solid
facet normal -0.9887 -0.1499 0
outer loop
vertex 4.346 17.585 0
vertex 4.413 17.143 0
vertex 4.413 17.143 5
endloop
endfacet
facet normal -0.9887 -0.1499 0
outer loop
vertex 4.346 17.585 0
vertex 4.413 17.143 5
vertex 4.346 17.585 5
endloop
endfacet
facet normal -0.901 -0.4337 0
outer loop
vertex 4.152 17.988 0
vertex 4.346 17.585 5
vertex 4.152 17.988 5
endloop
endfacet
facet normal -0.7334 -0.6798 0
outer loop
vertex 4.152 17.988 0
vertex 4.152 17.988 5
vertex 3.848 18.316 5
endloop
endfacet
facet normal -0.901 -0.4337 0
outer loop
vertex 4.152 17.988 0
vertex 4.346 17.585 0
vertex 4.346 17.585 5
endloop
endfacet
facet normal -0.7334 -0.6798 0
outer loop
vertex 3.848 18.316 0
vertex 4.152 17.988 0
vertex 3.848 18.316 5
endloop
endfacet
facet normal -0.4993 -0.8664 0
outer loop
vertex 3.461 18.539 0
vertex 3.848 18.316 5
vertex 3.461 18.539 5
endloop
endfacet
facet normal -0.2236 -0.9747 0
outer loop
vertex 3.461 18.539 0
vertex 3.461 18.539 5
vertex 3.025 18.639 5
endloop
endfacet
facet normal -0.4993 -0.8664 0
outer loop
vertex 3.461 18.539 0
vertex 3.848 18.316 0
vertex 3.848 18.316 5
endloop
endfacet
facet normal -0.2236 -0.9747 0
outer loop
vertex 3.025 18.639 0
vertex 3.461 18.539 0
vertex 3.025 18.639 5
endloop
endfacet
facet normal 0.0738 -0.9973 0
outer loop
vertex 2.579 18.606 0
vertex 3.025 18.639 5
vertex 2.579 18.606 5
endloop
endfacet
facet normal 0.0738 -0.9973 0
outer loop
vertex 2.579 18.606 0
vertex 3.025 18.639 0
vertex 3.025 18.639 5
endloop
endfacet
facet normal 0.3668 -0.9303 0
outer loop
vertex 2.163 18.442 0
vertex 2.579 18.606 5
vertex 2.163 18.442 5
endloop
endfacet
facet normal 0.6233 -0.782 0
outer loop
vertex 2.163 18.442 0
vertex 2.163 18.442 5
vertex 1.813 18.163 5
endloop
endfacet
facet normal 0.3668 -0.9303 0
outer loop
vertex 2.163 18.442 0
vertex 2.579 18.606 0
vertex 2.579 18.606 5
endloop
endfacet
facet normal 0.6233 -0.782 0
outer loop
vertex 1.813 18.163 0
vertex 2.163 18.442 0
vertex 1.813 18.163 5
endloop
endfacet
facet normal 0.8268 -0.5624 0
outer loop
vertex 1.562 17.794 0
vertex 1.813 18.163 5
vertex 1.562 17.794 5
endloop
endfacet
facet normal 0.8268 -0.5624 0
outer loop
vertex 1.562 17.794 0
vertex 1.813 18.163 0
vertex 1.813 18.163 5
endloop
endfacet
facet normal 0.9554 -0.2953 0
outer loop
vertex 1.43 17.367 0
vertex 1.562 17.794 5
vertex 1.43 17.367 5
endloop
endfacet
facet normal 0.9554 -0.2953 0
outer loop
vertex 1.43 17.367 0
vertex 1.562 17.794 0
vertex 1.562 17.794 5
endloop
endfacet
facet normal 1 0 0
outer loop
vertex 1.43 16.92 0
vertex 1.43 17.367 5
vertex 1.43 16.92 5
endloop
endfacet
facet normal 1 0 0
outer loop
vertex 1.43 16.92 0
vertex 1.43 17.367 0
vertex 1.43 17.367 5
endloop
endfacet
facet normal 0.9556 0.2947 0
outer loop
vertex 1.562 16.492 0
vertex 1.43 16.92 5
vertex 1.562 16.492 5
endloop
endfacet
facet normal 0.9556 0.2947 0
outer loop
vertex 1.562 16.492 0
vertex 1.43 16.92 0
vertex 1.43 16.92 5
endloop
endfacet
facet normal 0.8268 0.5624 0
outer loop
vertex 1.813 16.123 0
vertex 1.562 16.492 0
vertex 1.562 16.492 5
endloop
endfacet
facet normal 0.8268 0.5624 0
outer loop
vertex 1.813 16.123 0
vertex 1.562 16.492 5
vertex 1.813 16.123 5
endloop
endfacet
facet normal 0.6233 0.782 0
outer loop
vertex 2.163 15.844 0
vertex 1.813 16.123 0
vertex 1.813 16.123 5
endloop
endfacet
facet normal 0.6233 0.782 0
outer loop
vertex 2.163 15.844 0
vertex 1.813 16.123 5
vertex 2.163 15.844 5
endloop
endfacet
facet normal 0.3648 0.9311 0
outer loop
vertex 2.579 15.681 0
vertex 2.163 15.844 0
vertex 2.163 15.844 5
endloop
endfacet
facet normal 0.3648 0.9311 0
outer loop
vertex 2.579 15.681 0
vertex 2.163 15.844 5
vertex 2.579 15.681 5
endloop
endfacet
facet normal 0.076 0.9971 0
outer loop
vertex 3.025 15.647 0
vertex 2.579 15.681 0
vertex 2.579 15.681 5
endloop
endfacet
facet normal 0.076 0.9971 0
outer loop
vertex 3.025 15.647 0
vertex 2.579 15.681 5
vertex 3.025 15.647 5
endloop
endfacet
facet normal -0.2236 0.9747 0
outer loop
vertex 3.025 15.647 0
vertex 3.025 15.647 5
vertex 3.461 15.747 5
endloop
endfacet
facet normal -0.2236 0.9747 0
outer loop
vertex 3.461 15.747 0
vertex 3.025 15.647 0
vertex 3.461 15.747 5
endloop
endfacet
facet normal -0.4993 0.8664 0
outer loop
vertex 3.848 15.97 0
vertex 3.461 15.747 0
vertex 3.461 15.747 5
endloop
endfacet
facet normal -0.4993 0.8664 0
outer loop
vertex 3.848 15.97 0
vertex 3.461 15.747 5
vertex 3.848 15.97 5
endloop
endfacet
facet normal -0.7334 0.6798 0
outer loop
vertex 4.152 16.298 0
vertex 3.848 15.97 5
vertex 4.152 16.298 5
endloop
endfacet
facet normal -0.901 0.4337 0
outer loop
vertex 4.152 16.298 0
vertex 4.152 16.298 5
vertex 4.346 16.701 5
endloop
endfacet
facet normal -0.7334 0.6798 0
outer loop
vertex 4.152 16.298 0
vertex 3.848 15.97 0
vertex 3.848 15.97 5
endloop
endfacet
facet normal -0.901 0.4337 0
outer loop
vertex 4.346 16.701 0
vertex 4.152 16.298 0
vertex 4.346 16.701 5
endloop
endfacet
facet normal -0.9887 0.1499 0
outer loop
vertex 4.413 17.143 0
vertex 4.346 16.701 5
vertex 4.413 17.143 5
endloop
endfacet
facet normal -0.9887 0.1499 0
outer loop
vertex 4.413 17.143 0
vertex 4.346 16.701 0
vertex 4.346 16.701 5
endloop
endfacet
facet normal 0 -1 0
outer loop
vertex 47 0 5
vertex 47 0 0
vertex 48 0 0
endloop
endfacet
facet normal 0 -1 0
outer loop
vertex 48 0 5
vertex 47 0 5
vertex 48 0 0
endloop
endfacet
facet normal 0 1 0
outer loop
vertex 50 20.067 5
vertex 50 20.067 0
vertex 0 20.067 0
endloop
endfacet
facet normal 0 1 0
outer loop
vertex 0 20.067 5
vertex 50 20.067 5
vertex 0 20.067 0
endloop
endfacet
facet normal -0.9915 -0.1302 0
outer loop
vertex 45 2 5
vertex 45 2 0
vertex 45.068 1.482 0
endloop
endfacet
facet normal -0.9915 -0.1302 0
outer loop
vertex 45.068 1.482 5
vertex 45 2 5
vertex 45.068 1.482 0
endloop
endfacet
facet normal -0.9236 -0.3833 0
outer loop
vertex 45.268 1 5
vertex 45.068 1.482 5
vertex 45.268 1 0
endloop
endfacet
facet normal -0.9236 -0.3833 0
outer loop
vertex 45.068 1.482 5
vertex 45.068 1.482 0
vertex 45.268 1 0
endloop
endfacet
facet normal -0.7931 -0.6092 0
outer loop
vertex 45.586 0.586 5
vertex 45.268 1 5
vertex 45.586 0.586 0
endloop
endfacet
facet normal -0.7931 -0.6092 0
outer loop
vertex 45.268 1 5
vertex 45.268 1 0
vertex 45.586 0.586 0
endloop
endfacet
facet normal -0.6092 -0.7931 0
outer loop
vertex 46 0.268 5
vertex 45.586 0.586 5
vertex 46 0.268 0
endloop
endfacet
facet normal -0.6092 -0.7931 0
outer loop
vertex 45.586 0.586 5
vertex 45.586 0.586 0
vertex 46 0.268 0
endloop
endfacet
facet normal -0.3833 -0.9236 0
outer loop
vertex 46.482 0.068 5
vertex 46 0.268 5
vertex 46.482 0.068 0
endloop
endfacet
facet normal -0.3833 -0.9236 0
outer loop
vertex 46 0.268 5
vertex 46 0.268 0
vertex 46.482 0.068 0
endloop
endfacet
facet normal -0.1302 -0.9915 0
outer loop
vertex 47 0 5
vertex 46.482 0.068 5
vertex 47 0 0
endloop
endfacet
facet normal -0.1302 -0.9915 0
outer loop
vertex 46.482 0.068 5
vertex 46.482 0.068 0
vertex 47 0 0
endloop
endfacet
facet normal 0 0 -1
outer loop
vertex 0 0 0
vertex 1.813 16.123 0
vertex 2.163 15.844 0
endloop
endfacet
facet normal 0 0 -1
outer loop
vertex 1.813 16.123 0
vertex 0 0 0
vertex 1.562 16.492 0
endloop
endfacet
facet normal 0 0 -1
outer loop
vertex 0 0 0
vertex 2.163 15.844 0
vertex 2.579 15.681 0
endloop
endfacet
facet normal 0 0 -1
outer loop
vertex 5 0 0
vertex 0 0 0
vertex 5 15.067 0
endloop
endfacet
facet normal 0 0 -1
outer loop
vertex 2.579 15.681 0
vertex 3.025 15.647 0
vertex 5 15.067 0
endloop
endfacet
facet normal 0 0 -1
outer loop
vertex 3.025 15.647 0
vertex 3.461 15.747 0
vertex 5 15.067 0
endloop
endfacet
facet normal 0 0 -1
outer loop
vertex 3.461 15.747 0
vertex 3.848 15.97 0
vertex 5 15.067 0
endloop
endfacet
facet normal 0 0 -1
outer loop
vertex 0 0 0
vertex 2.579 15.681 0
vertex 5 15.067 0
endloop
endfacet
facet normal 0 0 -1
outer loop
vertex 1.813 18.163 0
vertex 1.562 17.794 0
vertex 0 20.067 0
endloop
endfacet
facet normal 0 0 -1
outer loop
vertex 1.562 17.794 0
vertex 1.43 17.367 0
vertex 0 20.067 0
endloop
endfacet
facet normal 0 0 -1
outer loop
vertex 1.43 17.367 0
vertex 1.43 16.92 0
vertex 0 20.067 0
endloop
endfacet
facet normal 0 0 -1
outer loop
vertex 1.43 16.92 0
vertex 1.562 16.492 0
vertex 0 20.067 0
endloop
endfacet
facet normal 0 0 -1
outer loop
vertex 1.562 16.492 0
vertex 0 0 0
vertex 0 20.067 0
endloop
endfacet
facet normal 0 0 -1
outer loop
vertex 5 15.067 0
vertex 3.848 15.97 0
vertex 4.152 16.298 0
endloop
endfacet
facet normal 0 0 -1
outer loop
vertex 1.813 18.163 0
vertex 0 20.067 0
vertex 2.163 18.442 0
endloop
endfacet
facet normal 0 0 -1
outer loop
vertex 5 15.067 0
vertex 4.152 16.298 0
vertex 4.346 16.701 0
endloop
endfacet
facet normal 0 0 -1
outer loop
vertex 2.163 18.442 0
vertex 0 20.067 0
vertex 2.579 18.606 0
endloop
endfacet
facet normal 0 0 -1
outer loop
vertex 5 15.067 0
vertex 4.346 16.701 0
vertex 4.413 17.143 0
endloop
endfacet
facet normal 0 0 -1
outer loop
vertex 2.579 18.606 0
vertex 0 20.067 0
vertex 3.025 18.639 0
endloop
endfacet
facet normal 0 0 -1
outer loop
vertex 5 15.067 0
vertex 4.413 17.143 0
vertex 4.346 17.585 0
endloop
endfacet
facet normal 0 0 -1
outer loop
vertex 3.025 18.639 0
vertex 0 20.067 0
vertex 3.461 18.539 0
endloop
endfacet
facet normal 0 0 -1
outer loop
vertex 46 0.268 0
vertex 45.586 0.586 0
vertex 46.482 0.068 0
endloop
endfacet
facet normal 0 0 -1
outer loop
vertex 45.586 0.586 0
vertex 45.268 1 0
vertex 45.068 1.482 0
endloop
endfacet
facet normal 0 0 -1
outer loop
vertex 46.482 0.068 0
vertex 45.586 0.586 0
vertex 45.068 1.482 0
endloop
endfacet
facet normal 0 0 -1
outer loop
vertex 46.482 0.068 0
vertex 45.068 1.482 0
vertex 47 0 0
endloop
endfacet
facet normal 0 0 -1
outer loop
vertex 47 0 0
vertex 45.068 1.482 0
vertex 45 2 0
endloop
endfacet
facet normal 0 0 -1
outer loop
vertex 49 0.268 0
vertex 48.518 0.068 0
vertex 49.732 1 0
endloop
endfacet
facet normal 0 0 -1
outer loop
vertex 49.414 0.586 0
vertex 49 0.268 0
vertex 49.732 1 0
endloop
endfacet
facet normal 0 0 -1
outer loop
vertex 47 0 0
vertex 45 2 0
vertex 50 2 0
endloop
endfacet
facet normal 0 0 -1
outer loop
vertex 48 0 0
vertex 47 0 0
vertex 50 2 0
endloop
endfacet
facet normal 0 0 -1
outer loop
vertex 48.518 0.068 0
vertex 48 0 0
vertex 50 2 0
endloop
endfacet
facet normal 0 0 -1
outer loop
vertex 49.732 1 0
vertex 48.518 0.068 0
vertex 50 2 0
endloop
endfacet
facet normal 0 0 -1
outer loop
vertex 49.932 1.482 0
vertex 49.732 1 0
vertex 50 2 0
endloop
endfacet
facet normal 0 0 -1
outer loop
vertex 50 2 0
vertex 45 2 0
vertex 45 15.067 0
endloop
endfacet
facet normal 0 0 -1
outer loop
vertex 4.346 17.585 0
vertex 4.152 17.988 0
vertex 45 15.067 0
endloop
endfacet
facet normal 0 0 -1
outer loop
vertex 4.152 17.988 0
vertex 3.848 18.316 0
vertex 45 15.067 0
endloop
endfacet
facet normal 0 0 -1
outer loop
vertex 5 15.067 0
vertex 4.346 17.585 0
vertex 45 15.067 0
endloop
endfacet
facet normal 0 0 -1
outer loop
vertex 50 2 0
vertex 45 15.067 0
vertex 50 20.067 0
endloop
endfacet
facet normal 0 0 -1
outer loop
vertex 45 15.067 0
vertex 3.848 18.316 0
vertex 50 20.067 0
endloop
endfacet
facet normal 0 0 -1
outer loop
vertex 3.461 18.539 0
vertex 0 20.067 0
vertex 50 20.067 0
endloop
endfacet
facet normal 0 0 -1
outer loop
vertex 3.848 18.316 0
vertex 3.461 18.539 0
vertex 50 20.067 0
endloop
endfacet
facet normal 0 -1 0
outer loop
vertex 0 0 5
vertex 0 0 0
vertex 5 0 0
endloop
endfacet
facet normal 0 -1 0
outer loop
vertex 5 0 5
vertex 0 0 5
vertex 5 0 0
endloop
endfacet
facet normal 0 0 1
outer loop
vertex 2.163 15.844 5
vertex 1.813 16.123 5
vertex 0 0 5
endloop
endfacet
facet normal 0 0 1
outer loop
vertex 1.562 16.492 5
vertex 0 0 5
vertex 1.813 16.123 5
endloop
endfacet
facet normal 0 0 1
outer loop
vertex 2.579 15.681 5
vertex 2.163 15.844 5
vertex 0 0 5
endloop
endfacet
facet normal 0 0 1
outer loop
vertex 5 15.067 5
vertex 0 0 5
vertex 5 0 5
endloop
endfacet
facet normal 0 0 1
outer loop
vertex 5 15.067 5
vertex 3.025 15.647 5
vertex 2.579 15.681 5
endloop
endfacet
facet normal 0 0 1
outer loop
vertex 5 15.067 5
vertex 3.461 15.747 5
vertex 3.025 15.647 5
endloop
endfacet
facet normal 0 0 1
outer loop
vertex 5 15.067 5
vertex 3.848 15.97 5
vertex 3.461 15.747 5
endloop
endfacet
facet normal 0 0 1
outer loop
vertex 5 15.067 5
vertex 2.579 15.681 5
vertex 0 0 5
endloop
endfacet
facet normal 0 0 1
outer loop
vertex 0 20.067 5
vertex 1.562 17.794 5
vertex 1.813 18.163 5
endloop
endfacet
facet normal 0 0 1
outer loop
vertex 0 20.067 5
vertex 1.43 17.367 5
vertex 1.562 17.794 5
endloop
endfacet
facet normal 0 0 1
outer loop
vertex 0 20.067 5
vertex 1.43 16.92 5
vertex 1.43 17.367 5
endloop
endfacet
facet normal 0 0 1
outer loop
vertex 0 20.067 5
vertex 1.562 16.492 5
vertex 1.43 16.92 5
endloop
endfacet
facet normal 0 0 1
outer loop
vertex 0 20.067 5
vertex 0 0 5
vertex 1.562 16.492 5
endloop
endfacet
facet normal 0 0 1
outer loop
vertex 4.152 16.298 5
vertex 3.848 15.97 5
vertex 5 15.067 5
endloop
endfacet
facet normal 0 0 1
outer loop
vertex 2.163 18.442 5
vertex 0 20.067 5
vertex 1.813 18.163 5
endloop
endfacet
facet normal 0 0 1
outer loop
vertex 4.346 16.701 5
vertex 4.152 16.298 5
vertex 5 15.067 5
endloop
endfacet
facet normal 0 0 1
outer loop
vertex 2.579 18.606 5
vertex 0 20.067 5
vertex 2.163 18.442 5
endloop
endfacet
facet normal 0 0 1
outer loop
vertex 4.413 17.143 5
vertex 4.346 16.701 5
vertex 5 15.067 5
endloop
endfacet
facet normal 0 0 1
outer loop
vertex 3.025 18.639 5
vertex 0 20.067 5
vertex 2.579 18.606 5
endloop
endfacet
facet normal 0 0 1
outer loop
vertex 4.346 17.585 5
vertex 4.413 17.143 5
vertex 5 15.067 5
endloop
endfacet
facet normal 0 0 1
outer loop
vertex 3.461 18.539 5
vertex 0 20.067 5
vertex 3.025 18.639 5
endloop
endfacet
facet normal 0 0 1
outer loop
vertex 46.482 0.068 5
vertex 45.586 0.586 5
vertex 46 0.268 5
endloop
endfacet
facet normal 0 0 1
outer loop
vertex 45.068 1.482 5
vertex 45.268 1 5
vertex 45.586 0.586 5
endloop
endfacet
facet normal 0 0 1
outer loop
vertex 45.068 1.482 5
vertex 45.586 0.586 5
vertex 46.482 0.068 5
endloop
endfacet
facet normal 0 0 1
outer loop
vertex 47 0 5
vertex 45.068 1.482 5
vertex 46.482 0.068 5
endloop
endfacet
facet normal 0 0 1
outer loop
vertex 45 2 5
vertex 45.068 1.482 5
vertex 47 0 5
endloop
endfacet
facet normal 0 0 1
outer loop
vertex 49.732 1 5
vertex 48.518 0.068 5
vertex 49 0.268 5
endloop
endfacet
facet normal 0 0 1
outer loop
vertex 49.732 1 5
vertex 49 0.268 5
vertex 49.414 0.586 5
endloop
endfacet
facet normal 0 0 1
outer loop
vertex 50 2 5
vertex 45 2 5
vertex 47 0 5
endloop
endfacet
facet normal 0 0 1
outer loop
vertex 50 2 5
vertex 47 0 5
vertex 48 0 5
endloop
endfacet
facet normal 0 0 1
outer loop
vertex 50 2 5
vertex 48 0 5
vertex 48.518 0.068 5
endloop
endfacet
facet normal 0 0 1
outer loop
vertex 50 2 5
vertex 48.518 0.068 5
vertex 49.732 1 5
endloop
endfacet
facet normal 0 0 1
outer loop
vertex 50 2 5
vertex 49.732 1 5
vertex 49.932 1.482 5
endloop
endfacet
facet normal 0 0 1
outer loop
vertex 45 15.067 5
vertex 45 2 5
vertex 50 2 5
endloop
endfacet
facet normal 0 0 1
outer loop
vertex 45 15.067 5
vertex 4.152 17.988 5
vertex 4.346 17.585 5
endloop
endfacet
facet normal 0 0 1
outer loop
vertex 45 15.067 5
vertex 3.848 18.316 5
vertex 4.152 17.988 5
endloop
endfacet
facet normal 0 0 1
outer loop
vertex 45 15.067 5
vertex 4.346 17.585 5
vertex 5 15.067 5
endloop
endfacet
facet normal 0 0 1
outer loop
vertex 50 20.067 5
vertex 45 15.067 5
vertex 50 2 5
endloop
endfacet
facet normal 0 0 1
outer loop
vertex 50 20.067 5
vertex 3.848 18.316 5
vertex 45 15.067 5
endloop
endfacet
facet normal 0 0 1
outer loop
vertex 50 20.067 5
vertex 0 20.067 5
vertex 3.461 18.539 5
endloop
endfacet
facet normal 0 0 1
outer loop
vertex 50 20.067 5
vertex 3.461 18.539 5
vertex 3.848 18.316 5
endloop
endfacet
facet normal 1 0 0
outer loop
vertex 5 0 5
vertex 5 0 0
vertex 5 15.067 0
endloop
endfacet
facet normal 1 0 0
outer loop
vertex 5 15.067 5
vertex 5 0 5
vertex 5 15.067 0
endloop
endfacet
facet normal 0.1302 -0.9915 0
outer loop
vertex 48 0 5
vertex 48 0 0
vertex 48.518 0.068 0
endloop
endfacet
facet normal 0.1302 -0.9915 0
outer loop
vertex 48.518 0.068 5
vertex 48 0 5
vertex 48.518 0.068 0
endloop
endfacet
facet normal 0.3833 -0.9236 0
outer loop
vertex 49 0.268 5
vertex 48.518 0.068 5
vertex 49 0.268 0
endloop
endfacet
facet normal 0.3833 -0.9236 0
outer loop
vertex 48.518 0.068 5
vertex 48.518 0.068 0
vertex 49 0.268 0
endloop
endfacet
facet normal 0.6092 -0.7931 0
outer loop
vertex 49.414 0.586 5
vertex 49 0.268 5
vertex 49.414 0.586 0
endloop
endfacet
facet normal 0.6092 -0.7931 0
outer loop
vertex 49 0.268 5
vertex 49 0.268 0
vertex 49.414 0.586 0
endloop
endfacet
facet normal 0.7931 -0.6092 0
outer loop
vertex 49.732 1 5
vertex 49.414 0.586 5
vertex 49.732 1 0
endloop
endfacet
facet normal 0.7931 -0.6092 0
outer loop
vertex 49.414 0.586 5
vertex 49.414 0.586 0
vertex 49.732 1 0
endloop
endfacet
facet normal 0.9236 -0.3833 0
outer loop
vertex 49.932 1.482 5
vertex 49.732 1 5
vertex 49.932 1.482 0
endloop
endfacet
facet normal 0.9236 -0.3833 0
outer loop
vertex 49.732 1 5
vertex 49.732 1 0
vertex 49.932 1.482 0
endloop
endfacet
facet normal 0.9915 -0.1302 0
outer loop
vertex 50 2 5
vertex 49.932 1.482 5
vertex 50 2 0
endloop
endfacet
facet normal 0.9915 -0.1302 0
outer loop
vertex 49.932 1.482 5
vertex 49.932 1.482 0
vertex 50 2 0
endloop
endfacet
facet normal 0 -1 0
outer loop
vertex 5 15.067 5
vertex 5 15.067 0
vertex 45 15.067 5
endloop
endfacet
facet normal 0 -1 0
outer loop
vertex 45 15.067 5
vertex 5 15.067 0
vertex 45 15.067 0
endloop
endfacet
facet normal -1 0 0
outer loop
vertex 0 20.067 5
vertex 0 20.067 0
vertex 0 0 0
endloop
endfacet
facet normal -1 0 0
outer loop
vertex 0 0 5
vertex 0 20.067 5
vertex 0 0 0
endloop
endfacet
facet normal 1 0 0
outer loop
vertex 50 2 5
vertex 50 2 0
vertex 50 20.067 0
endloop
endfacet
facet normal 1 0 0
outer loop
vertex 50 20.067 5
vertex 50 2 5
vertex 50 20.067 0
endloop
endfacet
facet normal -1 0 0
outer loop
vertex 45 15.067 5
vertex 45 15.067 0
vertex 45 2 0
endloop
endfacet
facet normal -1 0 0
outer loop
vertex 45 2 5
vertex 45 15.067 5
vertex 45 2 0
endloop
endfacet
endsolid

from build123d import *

# Parameters (mm, degrees)
F0_R     = 1.5
F1_DEPTH = 5


with BuildPart() as f1:
    # F0 (on Top) → F1 (new body)
    with BuildSketch(Plane.XY):
        with BuildLine():
            Line((0, 20.066716), (0, 0))
            Line((0, 0), (5, 0))
            Line((5, 0), (5, 15.066716))
            Line((5, 15.066716), (45, 15.066716))
            Line((45, 15.066716), (45, 2))
            ThreePointArc((45, 2), (45.585786, 0.585786), (47, 0))
            Line((47, 0), (48, 0))
            ThreePointArc((48, 0), (49.414214, 0.585786), (50, 2))
            Line((50, 2), (50, 20.066716))
            Line((50, 20.066716), (0, 20.066716))
        make_face()
        with Locations((2.913021, 17.143138)):
            Circle(F0_R, mode=Mode.SUBTRACT)
    extrude(amount=F1_DEPTH)


solid = f1.part
